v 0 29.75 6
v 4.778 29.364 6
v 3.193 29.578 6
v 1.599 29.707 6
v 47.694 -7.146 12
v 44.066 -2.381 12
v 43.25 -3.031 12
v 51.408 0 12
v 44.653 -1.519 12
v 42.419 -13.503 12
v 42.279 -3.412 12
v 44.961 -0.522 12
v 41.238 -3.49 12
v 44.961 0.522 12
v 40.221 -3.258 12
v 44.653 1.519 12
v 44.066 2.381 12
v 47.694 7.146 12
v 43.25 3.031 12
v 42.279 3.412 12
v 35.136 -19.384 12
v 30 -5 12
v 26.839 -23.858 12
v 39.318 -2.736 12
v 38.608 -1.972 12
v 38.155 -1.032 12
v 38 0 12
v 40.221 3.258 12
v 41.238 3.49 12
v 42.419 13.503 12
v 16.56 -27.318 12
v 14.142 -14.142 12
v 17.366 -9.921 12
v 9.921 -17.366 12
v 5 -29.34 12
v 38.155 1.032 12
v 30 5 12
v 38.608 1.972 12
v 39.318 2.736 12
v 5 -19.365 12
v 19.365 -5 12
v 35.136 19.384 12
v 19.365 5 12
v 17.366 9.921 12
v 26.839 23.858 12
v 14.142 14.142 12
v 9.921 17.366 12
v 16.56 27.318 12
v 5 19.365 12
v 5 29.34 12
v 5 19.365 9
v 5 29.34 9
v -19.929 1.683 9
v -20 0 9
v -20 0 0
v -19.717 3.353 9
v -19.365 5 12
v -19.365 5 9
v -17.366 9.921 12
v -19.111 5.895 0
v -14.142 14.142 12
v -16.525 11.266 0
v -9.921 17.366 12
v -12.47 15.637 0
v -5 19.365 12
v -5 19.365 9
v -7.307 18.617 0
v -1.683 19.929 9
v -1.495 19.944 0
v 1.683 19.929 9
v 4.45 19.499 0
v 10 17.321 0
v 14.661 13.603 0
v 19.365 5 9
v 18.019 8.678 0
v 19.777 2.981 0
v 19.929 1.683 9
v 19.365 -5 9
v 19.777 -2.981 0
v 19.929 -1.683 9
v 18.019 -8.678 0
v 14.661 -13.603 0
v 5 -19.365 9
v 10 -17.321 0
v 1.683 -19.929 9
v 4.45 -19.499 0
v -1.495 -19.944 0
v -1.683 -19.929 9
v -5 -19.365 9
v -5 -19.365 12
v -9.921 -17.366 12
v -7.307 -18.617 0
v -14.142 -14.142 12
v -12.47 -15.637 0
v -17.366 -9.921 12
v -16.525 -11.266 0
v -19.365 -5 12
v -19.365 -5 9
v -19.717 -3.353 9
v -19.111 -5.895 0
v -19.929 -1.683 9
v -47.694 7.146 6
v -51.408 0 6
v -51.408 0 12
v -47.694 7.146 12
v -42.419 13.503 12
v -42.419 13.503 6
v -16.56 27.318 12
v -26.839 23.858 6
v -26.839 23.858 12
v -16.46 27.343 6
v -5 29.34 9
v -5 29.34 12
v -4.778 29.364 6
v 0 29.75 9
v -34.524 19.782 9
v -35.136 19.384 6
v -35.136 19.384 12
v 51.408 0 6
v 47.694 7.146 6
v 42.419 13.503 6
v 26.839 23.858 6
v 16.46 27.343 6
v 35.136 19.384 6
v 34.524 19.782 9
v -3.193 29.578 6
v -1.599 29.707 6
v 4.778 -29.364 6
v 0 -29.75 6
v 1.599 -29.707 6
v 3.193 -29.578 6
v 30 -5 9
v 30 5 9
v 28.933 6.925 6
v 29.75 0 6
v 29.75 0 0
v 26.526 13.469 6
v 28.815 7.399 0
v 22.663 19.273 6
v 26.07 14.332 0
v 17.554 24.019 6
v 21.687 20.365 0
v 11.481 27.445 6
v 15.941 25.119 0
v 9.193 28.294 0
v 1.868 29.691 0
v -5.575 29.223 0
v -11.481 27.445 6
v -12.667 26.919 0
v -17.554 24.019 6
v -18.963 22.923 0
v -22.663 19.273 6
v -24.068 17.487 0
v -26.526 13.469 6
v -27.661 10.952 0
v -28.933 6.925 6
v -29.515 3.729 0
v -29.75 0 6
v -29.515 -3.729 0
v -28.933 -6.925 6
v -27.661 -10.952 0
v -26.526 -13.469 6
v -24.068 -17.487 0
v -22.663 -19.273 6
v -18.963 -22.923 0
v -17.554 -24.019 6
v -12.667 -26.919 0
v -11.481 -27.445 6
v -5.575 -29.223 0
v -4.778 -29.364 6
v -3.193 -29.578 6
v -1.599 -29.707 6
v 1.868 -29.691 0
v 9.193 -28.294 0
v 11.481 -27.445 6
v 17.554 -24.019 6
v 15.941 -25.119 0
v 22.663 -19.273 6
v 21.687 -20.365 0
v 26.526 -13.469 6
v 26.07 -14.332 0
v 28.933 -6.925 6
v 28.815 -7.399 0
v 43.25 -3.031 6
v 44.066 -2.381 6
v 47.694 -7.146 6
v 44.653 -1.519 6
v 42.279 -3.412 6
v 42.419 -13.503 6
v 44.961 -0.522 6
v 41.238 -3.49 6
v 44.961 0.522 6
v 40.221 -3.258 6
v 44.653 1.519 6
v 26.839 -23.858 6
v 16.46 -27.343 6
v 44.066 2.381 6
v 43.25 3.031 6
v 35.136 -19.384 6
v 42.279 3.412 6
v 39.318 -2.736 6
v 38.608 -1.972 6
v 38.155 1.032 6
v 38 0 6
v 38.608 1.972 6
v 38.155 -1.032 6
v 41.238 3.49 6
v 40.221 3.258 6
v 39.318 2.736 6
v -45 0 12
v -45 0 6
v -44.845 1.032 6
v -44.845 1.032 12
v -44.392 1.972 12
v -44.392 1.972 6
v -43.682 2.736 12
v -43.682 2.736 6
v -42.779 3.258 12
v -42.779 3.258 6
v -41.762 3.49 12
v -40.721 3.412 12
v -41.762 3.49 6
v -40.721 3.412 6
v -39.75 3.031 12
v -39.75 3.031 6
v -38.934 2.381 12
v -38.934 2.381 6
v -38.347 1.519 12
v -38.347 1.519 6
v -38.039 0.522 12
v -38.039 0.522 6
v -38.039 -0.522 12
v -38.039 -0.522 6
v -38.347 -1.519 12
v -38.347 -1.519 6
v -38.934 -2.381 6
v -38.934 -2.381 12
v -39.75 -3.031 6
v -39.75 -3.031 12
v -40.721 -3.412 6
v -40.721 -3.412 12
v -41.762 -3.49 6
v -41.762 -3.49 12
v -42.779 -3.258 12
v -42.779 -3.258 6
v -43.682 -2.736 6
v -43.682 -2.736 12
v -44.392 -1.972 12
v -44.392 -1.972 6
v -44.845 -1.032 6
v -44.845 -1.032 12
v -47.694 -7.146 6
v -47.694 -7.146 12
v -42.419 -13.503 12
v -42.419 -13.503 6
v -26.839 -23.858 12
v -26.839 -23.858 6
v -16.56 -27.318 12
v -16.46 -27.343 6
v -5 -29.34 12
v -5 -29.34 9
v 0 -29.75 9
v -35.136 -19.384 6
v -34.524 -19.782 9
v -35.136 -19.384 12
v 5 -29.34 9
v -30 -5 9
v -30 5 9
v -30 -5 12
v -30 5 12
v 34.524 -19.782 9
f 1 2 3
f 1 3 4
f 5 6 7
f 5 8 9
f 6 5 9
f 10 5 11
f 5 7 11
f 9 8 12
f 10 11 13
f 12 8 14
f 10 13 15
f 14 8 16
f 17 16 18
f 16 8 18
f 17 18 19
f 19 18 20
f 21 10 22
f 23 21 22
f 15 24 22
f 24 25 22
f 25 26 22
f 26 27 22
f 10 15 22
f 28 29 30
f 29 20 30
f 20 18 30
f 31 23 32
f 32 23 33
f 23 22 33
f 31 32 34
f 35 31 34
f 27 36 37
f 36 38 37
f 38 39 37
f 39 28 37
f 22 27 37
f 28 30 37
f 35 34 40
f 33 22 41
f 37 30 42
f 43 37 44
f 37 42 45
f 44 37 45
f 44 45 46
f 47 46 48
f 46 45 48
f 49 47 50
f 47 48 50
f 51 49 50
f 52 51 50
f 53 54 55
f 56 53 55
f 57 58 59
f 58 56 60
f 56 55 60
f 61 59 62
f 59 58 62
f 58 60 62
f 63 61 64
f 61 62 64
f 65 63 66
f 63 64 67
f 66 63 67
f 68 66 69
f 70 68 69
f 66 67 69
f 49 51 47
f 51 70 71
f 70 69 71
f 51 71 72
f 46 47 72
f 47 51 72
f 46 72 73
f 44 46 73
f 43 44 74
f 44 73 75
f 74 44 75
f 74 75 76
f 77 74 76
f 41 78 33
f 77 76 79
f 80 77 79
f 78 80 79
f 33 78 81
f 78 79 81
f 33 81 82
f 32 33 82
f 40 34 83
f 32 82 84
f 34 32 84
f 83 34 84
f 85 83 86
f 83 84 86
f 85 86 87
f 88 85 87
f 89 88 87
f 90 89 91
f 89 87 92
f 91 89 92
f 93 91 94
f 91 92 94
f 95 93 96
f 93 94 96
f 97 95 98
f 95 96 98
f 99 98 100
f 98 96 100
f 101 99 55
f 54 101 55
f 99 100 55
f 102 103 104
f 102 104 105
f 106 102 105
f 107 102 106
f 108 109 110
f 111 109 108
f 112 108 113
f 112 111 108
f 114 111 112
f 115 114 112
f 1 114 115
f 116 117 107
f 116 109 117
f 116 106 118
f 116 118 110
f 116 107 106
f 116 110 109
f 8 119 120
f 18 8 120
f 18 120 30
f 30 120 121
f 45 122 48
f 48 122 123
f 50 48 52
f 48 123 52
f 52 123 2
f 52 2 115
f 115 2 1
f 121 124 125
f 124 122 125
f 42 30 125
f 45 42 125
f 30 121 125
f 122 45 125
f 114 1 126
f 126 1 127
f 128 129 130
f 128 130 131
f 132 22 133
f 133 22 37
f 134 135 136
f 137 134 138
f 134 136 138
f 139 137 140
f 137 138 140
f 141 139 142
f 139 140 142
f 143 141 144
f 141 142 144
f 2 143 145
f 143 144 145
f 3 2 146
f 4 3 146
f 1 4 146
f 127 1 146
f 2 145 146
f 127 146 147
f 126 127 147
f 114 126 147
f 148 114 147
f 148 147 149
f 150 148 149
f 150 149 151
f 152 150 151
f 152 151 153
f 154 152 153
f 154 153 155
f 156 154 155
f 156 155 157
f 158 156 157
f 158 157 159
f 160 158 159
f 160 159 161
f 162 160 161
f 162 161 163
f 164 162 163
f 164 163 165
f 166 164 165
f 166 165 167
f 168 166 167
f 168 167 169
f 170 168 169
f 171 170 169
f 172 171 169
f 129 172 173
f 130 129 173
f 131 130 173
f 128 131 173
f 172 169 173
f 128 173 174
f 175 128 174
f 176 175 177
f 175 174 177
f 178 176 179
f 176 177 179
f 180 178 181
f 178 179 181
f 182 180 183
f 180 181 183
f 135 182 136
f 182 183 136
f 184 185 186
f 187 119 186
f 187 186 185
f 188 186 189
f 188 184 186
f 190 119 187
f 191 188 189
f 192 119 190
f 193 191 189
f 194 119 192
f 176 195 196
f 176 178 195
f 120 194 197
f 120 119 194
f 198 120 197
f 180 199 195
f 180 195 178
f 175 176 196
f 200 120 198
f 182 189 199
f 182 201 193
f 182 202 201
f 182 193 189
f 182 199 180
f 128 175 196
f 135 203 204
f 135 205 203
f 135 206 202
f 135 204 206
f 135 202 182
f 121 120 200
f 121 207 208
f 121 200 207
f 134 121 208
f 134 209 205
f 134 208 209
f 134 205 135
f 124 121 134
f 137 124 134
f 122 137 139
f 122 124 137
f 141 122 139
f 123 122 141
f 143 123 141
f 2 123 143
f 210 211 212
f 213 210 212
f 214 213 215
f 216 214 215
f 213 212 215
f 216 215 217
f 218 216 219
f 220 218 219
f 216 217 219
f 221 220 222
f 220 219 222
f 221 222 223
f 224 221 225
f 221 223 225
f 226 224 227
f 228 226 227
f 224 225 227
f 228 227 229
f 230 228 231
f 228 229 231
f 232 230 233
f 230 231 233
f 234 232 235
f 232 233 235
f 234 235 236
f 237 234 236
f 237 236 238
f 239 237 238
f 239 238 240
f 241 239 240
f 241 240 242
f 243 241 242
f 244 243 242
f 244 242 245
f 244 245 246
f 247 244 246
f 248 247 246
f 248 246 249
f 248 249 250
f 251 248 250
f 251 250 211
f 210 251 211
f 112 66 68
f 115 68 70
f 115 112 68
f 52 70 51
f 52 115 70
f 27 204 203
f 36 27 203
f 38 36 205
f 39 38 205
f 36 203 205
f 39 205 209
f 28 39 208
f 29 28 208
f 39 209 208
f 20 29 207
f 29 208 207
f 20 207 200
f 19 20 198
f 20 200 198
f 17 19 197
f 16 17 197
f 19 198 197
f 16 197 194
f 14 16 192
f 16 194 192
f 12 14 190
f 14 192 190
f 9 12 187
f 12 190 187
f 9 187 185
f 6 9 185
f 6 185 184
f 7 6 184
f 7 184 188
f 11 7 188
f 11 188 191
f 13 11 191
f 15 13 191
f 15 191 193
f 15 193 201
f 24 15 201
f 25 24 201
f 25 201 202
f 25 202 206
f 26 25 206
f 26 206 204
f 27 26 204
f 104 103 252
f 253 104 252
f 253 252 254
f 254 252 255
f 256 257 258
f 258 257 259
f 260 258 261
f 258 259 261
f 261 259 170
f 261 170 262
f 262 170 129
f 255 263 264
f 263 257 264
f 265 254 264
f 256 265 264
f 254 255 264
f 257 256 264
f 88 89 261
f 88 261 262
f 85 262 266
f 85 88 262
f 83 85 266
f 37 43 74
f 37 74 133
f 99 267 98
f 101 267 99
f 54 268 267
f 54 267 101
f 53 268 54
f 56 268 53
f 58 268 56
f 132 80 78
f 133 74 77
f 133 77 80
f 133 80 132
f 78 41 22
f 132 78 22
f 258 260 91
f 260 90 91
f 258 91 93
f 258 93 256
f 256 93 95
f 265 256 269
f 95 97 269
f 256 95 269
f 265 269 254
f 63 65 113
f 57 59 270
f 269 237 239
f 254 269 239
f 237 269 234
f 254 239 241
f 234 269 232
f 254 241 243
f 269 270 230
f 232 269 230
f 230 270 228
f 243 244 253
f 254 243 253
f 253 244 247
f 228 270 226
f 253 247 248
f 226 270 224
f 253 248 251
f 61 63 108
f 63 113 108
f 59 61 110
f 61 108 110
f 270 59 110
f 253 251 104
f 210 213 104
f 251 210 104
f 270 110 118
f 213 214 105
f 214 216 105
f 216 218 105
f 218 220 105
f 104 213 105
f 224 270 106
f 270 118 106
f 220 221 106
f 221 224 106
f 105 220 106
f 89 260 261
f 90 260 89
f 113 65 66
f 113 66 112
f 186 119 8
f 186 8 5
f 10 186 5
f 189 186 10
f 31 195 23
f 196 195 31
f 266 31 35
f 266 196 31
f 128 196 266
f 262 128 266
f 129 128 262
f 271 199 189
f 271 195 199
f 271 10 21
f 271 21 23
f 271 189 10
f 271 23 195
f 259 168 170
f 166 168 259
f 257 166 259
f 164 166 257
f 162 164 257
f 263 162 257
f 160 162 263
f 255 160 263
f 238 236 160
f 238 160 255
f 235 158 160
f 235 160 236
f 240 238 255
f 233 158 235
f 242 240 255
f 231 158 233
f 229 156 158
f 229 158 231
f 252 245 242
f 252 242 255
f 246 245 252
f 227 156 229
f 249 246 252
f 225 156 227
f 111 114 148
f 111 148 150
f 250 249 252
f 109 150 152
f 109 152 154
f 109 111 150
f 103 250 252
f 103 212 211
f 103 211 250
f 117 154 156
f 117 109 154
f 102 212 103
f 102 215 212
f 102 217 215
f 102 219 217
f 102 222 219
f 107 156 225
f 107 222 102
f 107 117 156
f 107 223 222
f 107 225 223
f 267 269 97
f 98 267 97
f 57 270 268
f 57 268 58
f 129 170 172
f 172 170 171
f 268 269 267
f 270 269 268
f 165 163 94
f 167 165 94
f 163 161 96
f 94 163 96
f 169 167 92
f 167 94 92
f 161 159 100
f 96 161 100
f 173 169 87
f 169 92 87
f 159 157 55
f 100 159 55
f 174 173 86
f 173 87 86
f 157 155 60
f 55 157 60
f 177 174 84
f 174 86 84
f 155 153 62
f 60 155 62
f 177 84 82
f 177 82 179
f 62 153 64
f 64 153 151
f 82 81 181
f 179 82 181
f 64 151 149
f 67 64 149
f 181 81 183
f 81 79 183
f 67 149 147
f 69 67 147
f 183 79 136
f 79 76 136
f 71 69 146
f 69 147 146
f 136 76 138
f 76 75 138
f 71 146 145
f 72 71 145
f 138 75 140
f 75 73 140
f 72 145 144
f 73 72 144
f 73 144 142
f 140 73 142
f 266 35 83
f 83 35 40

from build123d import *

# Parameters (mm, degrees)
F0_R      = 29.75
F1_DEPTH  = 6
F3_D      = 40
F5_DEPTH  = 6
F7_D      = 40
F9_D      = 7
F10_W     = 10
F10_H     = 65.1724559439
F11_DEPTH = 3
F12_W     = 60
F12_H     = 10
F13_DEPTH = 3


with BuildPart() as f1:
    # F0 (on Top) → F1 (new body)
    with BuildSketch(Plane.XY):
        Circle(F0_R)
    extrude(amount=F1_DEPTH)

    # F3 (through all)
    with Locations(Plane(origin=(0, 0, 0), x_dir=(1, 0, 0), z_dir=(0, 0, -1))):
        with Locations((0, 0)):
            Hole(F3_D / 2)

    # F4 (on face) → F5 (join)
    with BuildSketch(Plane.XY.offset(6)):
        with BuildLine():
            add(Edge.make_bspline(
                [(-51.4080040157, 0), (-48.3840033412, 7.9380003735), (-35.2209347961, 22.8401058322), (-13.735502027, 28.9573147893), (0, 29.75)],
                knots=[0, 0, 0, 0, 0.4596753041, 1, 1, 1, 1], degree=3))
            add(Edge.make_bspline(
                [(-51.4080040157, 0), (-48.3840033412, -7.9380003735), (-35.2209347961, -22.8401058322), (-13.735502027, -28.9573147893), (0, -29.75)],
                knots=[0, 0, 0, 0, 0.4596753041, 1, 1, 1, 1], degree=3))
            add(Edge.make_bspline(
                [(51.4080040157, 0), (48.3840033412, -7.9380003735), (35.2209347961, -22.8401058322), (13.735502027, -28.9573147893), (0, -29.75)],
                knots=[0, 0, 0, 0, 0.4596753041, 1, 1, 1, 1], degree=3))
            add(Edge.make_bspline(
                [(51.4080040157, 0), (48.3840033412, 7.9380003735), (35.2209347961, 22.8401058322), (13.735502027, 28.9573147893), (0, 29.75)],
                knots=[0, 0, 0, 0, 0.4596753041, 1, 1, 1, 1], degree=3))
        make_face()
    extrude(amount=F5_DEPTH)

    # F7 (through all)
    with Locations(Plane.XY.offset(12)):
        with Locations((0, 0)):
            Hole(F7_D / 2)

    # F9 (through all)
    with Locations(Plane.XY.offset(12)):
        with Locations((-41.5, 0), (41.5, 0)):
            Hole(F9_D / 2)

    # F10 (on face) → F11 (cut)
    with BuildSketch(Plane.XY.offset(12)):
        Rectangle(F10_W, F10_H)
    extrude(amount=-F11_DEPTH, mode=Mode.SUBTRACT)

    # F12 (on face) → F13 (cut)
    with BuildSketch(Plane.XY.offset(12)):
        Rectangle(F12_W, F12_H)
    extrude(amount=-F13_DEPTH, mode=Mode.SUBTRACT)


solid = f1.part
